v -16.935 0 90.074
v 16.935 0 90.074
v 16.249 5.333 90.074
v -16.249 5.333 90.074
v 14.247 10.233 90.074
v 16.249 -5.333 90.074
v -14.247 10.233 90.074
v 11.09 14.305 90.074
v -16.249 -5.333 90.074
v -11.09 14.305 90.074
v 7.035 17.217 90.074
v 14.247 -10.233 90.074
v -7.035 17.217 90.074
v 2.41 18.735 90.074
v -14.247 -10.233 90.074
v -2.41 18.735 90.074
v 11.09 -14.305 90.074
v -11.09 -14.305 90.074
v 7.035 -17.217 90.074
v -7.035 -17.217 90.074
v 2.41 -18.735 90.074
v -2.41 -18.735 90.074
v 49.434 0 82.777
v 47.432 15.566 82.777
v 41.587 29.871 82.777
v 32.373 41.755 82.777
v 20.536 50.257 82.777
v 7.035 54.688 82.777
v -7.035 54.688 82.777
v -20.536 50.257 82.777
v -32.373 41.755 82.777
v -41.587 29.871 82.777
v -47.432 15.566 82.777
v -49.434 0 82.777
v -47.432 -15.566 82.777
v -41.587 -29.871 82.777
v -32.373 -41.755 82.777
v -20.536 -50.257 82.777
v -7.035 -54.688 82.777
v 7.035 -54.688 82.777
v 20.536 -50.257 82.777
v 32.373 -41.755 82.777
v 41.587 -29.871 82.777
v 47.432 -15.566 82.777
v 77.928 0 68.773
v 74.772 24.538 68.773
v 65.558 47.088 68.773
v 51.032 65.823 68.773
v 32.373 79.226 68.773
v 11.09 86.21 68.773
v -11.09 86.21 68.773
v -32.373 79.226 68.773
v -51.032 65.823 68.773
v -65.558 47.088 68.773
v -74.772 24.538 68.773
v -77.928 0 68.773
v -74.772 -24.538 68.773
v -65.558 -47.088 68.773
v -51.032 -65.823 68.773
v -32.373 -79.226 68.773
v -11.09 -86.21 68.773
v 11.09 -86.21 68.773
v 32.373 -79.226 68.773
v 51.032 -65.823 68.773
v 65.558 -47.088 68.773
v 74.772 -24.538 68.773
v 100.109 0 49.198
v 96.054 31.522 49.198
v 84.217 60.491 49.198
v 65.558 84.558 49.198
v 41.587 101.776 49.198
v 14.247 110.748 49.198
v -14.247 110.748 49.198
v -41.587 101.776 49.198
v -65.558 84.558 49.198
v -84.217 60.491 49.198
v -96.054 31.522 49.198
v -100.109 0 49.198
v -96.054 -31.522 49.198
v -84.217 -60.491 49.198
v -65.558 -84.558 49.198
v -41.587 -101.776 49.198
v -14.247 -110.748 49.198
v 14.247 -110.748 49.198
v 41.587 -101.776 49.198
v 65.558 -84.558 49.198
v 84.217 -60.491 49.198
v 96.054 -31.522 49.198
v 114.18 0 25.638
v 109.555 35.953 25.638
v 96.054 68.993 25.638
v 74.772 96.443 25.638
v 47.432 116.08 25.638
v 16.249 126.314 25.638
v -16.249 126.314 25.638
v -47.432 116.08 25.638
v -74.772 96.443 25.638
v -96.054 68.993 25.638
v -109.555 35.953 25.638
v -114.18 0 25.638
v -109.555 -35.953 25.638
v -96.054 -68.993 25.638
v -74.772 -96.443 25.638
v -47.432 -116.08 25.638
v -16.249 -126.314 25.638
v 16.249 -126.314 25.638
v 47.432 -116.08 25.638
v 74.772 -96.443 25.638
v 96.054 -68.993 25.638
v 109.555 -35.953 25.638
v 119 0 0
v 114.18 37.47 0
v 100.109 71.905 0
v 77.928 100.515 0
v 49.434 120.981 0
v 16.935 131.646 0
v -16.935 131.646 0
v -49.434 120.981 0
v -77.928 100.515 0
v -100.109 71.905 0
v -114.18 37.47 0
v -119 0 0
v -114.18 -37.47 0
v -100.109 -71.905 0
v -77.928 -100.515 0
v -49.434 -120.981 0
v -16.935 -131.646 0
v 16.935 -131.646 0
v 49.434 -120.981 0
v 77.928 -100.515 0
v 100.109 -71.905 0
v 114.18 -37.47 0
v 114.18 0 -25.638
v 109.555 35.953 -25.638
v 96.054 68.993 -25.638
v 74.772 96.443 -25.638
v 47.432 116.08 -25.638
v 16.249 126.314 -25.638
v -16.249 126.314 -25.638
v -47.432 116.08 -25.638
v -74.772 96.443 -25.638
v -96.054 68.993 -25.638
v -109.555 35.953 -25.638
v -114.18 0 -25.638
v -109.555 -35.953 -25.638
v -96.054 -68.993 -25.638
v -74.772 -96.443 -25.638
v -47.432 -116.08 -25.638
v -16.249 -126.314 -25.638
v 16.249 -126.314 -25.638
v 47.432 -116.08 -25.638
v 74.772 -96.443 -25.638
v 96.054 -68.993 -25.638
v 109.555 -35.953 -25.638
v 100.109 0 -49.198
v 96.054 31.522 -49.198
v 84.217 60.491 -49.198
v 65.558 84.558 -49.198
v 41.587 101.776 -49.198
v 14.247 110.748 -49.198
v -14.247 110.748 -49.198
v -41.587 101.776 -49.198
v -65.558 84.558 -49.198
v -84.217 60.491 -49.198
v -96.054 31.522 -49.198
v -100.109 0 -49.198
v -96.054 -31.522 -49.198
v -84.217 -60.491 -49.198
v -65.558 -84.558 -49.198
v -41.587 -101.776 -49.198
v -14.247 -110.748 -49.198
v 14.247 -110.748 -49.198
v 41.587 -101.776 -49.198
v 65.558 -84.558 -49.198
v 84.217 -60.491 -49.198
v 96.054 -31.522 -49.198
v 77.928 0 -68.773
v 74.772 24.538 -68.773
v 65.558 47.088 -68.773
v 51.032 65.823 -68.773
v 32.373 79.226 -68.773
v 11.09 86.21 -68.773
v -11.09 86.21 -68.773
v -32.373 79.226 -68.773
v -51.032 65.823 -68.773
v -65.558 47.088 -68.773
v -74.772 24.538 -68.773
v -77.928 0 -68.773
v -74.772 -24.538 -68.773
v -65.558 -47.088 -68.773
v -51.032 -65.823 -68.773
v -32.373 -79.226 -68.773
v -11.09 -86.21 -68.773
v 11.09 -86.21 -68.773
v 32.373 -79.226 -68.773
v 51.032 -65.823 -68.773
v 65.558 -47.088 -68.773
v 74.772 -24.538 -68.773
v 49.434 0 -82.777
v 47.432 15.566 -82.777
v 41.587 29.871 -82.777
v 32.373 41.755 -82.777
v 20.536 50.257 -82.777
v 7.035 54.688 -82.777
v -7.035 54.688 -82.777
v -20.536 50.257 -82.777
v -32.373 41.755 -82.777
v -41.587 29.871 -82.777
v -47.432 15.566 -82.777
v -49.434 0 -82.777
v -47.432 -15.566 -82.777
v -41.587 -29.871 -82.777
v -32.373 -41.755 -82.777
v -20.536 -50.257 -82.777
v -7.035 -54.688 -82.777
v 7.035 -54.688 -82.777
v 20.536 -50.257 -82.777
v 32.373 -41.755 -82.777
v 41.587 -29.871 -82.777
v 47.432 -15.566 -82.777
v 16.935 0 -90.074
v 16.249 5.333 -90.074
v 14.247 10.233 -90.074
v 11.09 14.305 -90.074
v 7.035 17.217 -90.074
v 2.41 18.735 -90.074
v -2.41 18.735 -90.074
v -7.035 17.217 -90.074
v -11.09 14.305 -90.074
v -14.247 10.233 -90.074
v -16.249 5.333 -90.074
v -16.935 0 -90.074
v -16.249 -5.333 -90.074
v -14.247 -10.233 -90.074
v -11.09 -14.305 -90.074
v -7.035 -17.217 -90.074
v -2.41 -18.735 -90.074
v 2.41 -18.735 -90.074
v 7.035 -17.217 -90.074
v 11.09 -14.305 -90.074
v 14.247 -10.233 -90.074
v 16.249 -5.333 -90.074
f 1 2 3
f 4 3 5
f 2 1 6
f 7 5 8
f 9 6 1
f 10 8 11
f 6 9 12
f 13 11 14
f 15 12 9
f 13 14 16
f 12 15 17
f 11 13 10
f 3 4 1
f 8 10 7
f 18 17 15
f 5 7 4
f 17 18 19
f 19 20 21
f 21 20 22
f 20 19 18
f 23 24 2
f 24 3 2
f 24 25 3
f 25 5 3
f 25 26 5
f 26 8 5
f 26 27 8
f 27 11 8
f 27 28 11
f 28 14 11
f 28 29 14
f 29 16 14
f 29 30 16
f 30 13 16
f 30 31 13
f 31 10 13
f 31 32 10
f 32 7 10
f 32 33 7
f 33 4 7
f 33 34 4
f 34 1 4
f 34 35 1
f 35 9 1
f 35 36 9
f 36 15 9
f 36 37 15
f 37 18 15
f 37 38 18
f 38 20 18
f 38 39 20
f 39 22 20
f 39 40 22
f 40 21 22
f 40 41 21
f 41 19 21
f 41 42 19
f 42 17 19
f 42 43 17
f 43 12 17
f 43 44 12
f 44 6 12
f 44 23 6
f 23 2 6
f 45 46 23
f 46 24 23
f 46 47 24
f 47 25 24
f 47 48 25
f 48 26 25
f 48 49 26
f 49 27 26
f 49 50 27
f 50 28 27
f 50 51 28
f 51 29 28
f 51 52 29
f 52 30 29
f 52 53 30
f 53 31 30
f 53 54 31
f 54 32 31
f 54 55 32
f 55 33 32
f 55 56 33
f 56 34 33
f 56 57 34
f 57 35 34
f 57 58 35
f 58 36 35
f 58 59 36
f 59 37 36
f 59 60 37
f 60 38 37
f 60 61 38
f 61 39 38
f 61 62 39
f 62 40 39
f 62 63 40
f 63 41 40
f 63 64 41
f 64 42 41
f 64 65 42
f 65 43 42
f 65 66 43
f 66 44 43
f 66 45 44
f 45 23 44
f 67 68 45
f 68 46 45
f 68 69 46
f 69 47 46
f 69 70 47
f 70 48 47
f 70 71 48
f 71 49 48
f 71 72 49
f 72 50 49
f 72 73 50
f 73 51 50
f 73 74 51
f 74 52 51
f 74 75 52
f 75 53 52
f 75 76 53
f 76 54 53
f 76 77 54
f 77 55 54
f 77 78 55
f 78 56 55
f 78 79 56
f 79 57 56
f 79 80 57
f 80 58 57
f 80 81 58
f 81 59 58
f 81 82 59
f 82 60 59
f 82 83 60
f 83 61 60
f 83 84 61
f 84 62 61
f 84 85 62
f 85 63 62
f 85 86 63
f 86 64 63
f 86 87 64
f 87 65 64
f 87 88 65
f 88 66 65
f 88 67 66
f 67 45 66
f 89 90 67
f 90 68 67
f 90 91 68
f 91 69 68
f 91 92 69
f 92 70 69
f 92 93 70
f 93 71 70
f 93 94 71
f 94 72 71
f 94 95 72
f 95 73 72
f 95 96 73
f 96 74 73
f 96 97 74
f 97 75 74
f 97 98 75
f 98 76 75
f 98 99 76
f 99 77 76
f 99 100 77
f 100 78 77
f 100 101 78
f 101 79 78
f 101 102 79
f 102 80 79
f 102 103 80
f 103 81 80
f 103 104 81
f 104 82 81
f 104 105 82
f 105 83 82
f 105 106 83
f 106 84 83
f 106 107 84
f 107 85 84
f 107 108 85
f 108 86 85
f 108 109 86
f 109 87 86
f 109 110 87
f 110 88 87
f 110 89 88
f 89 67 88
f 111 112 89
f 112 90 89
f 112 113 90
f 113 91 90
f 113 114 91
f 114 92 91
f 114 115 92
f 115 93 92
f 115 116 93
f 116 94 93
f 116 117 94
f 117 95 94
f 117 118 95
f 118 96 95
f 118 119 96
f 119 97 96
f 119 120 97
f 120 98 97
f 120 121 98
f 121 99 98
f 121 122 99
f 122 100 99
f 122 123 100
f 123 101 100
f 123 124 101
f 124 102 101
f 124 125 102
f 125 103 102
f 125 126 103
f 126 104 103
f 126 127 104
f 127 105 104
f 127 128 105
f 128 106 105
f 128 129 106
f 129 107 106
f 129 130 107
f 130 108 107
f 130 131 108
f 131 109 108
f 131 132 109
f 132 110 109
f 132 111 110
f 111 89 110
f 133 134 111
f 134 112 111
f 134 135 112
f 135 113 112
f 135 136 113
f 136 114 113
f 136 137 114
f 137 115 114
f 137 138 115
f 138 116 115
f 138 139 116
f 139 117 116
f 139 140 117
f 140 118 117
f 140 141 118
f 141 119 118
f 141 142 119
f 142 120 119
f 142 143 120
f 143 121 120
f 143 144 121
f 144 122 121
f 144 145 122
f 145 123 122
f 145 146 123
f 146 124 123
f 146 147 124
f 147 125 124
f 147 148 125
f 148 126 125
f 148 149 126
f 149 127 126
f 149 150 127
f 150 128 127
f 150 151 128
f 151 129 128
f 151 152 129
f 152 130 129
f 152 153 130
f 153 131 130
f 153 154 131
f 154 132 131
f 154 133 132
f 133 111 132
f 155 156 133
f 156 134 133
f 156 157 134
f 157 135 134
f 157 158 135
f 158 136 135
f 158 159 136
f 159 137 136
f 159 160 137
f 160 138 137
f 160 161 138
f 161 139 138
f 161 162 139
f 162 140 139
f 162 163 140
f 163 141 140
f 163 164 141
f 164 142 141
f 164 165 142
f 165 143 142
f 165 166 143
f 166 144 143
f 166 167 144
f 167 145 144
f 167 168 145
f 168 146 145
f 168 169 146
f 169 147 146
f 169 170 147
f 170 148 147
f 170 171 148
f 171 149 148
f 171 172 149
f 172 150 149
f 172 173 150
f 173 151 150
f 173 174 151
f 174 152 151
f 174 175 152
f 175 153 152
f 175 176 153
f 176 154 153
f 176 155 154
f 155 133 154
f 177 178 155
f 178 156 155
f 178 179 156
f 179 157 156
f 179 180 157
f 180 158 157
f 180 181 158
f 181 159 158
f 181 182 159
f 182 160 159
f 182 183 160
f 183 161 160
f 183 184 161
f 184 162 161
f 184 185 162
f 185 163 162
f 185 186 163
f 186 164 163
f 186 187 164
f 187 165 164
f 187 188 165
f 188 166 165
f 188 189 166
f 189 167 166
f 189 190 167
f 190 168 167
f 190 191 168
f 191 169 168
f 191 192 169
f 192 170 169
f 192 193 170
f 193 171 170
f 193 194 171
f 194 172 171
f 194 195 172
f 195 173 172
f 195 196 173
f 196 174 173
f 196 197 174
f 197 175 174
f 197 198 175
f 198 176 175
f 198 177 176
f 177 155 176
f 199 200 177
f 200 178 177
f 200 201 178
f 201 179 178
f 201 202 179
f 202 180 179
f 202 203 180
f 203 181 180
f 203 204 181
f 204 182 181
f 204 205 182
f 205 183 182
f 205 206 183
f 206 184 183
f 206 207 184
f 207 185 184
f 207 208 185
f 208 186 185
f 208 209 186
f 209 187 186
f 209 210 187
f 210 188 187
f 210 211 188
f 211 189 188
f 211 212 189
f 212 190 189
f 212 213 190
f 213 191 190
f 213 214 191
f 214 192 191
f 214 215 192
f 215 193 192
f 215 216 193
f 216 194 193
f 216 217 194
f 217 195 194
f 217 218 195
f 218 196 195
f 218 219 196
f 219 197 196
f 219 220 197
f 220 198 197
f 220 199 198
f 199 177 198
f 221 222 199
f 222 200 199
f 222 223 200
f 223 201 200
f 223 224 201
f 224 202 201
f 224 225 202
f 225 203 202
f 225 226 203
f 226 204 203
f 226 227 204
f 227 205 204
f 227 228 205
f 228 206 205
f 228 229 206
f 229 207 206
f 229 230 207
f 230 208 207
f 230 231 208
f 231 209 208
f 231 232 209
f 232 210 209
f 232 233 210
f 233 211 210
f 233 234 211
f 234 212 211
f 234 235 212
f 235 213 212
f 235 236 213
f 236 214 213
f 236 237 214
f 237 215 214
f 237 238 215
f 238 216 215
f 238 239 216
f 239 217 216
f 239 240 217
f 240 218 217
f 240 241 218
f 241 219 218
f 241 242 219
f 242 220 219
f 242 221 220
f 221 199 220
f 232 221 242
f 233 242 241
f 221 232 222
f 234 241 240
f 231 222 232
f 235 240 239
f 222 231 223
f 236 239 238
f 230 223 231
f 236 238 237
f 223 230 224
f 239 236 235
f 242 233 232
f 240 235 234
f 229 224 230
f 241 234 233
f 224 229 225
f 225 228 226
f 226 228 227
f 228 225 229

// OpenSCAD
// Generated by SolidPython 1.0.1 on 2020-07-29 00:46:53


scale(v = [17, 19, 13]) {
	sphere(r = 7);
}
/***********************************************
*********      SolidPython code:      **********
************************************************
 
# import packages: SolidPython
from solid import *
from solid.utils import *
from itertools import chain, combinations, permutations


class Resize:

    def __init__(self, scad_file):
        self.scad_file = scad_file
        #self.scad_file = import_scad(scad_file)
        # cone/cylinder param:
        self.r1 = 0
        self.r2 = 0
        self.h = 0
        # rectangular prism param:
        self.w = 0
        self.l = 0
        # ellipse param:
        self.r = 0

    # import OpenScad code (file name corresponds to shape)


    # classify shape + parameters
    def assign(self, param1, param2, param3):
        if self.scad_file == 'cone.scad':
            self.r1 = param1
            self.r2 = param2
            self.h = param3
        elif self.scad_file == 'cylinder.scad':
            self.r1 = param1
            self.r2 = param2
            self.h = param3
        elif self.scad_file == 'rectangularPrism.scad':
            self.h = param1
            self.l = param2
            self.w = param3
        else:
            self.r = param1
            self.h = param2

    # resize parameters
    def iterate(self):
        x = range(3, 20, 2)
        i = 1
        if self.scad_file == 'cone.scad':
            tempList = list(permutations(x, 2))
            for temp in tempList:
                param1 = temp[0]
                param2 = temp[1]
                filepath = 'produced_scad_files/' + 'cone' + str(param1) + '_' + str(param2) + '_' + '.scad'
                scad_render_to_file(cylinder(h=param1, r1=param2, r2=0), filepath)

        elif self.scad_file == 'cylinder.scad':
            tempList = list(permutations(x, 3))
            for temp in tempList:
                param1 = temp[0]
                param2 = temp[1]
                filepath = 'produced_scad_files/' + 'cylinder' + str(param1) + '_' + str(param2) + '_' + '.scad'
                scad_render_to_file(cylinder(h=param1, r1=param2, r2=param2), filepath)

        elif self.scad_file == 'rectangularPrism.scad':
            tempList = list(permutations(x, 3))
            for temp in tempList:
                param1 = temp[0]
                param2 = temp[1]
                param3 = temp[2]
                filepath = 'produced_scad_files/' + 'rectangularPrism' + str(param1) + '_' + str(param2) + '_' + str(
                    param3) + '.scad'
                scad_render_to_file(cube(size=(param1, param2, param3)), filepath)

        elif self.scad_file == 'ellipse.scad':
            tempList = list(permutations(x, 4))
            for temp in tempList:
                param1 = temp[0]
                param2 = temp[1]
                param3 = temp[2]
                param4 = temp[3]
                filepath = 'produced_scad_files/' + 'ellipse' + str(param1) + '_' + str(param2) + '_' + str(param3) + '_' + str(param4) + '.scad'
                scad_render_to_file(scale([param1, param2, param3])(sphere(r=param4)), filepath)

    def render_to_scadfile(self):
        scad_render_to_file(scad, 'example.scad') 
 
************************************************/
